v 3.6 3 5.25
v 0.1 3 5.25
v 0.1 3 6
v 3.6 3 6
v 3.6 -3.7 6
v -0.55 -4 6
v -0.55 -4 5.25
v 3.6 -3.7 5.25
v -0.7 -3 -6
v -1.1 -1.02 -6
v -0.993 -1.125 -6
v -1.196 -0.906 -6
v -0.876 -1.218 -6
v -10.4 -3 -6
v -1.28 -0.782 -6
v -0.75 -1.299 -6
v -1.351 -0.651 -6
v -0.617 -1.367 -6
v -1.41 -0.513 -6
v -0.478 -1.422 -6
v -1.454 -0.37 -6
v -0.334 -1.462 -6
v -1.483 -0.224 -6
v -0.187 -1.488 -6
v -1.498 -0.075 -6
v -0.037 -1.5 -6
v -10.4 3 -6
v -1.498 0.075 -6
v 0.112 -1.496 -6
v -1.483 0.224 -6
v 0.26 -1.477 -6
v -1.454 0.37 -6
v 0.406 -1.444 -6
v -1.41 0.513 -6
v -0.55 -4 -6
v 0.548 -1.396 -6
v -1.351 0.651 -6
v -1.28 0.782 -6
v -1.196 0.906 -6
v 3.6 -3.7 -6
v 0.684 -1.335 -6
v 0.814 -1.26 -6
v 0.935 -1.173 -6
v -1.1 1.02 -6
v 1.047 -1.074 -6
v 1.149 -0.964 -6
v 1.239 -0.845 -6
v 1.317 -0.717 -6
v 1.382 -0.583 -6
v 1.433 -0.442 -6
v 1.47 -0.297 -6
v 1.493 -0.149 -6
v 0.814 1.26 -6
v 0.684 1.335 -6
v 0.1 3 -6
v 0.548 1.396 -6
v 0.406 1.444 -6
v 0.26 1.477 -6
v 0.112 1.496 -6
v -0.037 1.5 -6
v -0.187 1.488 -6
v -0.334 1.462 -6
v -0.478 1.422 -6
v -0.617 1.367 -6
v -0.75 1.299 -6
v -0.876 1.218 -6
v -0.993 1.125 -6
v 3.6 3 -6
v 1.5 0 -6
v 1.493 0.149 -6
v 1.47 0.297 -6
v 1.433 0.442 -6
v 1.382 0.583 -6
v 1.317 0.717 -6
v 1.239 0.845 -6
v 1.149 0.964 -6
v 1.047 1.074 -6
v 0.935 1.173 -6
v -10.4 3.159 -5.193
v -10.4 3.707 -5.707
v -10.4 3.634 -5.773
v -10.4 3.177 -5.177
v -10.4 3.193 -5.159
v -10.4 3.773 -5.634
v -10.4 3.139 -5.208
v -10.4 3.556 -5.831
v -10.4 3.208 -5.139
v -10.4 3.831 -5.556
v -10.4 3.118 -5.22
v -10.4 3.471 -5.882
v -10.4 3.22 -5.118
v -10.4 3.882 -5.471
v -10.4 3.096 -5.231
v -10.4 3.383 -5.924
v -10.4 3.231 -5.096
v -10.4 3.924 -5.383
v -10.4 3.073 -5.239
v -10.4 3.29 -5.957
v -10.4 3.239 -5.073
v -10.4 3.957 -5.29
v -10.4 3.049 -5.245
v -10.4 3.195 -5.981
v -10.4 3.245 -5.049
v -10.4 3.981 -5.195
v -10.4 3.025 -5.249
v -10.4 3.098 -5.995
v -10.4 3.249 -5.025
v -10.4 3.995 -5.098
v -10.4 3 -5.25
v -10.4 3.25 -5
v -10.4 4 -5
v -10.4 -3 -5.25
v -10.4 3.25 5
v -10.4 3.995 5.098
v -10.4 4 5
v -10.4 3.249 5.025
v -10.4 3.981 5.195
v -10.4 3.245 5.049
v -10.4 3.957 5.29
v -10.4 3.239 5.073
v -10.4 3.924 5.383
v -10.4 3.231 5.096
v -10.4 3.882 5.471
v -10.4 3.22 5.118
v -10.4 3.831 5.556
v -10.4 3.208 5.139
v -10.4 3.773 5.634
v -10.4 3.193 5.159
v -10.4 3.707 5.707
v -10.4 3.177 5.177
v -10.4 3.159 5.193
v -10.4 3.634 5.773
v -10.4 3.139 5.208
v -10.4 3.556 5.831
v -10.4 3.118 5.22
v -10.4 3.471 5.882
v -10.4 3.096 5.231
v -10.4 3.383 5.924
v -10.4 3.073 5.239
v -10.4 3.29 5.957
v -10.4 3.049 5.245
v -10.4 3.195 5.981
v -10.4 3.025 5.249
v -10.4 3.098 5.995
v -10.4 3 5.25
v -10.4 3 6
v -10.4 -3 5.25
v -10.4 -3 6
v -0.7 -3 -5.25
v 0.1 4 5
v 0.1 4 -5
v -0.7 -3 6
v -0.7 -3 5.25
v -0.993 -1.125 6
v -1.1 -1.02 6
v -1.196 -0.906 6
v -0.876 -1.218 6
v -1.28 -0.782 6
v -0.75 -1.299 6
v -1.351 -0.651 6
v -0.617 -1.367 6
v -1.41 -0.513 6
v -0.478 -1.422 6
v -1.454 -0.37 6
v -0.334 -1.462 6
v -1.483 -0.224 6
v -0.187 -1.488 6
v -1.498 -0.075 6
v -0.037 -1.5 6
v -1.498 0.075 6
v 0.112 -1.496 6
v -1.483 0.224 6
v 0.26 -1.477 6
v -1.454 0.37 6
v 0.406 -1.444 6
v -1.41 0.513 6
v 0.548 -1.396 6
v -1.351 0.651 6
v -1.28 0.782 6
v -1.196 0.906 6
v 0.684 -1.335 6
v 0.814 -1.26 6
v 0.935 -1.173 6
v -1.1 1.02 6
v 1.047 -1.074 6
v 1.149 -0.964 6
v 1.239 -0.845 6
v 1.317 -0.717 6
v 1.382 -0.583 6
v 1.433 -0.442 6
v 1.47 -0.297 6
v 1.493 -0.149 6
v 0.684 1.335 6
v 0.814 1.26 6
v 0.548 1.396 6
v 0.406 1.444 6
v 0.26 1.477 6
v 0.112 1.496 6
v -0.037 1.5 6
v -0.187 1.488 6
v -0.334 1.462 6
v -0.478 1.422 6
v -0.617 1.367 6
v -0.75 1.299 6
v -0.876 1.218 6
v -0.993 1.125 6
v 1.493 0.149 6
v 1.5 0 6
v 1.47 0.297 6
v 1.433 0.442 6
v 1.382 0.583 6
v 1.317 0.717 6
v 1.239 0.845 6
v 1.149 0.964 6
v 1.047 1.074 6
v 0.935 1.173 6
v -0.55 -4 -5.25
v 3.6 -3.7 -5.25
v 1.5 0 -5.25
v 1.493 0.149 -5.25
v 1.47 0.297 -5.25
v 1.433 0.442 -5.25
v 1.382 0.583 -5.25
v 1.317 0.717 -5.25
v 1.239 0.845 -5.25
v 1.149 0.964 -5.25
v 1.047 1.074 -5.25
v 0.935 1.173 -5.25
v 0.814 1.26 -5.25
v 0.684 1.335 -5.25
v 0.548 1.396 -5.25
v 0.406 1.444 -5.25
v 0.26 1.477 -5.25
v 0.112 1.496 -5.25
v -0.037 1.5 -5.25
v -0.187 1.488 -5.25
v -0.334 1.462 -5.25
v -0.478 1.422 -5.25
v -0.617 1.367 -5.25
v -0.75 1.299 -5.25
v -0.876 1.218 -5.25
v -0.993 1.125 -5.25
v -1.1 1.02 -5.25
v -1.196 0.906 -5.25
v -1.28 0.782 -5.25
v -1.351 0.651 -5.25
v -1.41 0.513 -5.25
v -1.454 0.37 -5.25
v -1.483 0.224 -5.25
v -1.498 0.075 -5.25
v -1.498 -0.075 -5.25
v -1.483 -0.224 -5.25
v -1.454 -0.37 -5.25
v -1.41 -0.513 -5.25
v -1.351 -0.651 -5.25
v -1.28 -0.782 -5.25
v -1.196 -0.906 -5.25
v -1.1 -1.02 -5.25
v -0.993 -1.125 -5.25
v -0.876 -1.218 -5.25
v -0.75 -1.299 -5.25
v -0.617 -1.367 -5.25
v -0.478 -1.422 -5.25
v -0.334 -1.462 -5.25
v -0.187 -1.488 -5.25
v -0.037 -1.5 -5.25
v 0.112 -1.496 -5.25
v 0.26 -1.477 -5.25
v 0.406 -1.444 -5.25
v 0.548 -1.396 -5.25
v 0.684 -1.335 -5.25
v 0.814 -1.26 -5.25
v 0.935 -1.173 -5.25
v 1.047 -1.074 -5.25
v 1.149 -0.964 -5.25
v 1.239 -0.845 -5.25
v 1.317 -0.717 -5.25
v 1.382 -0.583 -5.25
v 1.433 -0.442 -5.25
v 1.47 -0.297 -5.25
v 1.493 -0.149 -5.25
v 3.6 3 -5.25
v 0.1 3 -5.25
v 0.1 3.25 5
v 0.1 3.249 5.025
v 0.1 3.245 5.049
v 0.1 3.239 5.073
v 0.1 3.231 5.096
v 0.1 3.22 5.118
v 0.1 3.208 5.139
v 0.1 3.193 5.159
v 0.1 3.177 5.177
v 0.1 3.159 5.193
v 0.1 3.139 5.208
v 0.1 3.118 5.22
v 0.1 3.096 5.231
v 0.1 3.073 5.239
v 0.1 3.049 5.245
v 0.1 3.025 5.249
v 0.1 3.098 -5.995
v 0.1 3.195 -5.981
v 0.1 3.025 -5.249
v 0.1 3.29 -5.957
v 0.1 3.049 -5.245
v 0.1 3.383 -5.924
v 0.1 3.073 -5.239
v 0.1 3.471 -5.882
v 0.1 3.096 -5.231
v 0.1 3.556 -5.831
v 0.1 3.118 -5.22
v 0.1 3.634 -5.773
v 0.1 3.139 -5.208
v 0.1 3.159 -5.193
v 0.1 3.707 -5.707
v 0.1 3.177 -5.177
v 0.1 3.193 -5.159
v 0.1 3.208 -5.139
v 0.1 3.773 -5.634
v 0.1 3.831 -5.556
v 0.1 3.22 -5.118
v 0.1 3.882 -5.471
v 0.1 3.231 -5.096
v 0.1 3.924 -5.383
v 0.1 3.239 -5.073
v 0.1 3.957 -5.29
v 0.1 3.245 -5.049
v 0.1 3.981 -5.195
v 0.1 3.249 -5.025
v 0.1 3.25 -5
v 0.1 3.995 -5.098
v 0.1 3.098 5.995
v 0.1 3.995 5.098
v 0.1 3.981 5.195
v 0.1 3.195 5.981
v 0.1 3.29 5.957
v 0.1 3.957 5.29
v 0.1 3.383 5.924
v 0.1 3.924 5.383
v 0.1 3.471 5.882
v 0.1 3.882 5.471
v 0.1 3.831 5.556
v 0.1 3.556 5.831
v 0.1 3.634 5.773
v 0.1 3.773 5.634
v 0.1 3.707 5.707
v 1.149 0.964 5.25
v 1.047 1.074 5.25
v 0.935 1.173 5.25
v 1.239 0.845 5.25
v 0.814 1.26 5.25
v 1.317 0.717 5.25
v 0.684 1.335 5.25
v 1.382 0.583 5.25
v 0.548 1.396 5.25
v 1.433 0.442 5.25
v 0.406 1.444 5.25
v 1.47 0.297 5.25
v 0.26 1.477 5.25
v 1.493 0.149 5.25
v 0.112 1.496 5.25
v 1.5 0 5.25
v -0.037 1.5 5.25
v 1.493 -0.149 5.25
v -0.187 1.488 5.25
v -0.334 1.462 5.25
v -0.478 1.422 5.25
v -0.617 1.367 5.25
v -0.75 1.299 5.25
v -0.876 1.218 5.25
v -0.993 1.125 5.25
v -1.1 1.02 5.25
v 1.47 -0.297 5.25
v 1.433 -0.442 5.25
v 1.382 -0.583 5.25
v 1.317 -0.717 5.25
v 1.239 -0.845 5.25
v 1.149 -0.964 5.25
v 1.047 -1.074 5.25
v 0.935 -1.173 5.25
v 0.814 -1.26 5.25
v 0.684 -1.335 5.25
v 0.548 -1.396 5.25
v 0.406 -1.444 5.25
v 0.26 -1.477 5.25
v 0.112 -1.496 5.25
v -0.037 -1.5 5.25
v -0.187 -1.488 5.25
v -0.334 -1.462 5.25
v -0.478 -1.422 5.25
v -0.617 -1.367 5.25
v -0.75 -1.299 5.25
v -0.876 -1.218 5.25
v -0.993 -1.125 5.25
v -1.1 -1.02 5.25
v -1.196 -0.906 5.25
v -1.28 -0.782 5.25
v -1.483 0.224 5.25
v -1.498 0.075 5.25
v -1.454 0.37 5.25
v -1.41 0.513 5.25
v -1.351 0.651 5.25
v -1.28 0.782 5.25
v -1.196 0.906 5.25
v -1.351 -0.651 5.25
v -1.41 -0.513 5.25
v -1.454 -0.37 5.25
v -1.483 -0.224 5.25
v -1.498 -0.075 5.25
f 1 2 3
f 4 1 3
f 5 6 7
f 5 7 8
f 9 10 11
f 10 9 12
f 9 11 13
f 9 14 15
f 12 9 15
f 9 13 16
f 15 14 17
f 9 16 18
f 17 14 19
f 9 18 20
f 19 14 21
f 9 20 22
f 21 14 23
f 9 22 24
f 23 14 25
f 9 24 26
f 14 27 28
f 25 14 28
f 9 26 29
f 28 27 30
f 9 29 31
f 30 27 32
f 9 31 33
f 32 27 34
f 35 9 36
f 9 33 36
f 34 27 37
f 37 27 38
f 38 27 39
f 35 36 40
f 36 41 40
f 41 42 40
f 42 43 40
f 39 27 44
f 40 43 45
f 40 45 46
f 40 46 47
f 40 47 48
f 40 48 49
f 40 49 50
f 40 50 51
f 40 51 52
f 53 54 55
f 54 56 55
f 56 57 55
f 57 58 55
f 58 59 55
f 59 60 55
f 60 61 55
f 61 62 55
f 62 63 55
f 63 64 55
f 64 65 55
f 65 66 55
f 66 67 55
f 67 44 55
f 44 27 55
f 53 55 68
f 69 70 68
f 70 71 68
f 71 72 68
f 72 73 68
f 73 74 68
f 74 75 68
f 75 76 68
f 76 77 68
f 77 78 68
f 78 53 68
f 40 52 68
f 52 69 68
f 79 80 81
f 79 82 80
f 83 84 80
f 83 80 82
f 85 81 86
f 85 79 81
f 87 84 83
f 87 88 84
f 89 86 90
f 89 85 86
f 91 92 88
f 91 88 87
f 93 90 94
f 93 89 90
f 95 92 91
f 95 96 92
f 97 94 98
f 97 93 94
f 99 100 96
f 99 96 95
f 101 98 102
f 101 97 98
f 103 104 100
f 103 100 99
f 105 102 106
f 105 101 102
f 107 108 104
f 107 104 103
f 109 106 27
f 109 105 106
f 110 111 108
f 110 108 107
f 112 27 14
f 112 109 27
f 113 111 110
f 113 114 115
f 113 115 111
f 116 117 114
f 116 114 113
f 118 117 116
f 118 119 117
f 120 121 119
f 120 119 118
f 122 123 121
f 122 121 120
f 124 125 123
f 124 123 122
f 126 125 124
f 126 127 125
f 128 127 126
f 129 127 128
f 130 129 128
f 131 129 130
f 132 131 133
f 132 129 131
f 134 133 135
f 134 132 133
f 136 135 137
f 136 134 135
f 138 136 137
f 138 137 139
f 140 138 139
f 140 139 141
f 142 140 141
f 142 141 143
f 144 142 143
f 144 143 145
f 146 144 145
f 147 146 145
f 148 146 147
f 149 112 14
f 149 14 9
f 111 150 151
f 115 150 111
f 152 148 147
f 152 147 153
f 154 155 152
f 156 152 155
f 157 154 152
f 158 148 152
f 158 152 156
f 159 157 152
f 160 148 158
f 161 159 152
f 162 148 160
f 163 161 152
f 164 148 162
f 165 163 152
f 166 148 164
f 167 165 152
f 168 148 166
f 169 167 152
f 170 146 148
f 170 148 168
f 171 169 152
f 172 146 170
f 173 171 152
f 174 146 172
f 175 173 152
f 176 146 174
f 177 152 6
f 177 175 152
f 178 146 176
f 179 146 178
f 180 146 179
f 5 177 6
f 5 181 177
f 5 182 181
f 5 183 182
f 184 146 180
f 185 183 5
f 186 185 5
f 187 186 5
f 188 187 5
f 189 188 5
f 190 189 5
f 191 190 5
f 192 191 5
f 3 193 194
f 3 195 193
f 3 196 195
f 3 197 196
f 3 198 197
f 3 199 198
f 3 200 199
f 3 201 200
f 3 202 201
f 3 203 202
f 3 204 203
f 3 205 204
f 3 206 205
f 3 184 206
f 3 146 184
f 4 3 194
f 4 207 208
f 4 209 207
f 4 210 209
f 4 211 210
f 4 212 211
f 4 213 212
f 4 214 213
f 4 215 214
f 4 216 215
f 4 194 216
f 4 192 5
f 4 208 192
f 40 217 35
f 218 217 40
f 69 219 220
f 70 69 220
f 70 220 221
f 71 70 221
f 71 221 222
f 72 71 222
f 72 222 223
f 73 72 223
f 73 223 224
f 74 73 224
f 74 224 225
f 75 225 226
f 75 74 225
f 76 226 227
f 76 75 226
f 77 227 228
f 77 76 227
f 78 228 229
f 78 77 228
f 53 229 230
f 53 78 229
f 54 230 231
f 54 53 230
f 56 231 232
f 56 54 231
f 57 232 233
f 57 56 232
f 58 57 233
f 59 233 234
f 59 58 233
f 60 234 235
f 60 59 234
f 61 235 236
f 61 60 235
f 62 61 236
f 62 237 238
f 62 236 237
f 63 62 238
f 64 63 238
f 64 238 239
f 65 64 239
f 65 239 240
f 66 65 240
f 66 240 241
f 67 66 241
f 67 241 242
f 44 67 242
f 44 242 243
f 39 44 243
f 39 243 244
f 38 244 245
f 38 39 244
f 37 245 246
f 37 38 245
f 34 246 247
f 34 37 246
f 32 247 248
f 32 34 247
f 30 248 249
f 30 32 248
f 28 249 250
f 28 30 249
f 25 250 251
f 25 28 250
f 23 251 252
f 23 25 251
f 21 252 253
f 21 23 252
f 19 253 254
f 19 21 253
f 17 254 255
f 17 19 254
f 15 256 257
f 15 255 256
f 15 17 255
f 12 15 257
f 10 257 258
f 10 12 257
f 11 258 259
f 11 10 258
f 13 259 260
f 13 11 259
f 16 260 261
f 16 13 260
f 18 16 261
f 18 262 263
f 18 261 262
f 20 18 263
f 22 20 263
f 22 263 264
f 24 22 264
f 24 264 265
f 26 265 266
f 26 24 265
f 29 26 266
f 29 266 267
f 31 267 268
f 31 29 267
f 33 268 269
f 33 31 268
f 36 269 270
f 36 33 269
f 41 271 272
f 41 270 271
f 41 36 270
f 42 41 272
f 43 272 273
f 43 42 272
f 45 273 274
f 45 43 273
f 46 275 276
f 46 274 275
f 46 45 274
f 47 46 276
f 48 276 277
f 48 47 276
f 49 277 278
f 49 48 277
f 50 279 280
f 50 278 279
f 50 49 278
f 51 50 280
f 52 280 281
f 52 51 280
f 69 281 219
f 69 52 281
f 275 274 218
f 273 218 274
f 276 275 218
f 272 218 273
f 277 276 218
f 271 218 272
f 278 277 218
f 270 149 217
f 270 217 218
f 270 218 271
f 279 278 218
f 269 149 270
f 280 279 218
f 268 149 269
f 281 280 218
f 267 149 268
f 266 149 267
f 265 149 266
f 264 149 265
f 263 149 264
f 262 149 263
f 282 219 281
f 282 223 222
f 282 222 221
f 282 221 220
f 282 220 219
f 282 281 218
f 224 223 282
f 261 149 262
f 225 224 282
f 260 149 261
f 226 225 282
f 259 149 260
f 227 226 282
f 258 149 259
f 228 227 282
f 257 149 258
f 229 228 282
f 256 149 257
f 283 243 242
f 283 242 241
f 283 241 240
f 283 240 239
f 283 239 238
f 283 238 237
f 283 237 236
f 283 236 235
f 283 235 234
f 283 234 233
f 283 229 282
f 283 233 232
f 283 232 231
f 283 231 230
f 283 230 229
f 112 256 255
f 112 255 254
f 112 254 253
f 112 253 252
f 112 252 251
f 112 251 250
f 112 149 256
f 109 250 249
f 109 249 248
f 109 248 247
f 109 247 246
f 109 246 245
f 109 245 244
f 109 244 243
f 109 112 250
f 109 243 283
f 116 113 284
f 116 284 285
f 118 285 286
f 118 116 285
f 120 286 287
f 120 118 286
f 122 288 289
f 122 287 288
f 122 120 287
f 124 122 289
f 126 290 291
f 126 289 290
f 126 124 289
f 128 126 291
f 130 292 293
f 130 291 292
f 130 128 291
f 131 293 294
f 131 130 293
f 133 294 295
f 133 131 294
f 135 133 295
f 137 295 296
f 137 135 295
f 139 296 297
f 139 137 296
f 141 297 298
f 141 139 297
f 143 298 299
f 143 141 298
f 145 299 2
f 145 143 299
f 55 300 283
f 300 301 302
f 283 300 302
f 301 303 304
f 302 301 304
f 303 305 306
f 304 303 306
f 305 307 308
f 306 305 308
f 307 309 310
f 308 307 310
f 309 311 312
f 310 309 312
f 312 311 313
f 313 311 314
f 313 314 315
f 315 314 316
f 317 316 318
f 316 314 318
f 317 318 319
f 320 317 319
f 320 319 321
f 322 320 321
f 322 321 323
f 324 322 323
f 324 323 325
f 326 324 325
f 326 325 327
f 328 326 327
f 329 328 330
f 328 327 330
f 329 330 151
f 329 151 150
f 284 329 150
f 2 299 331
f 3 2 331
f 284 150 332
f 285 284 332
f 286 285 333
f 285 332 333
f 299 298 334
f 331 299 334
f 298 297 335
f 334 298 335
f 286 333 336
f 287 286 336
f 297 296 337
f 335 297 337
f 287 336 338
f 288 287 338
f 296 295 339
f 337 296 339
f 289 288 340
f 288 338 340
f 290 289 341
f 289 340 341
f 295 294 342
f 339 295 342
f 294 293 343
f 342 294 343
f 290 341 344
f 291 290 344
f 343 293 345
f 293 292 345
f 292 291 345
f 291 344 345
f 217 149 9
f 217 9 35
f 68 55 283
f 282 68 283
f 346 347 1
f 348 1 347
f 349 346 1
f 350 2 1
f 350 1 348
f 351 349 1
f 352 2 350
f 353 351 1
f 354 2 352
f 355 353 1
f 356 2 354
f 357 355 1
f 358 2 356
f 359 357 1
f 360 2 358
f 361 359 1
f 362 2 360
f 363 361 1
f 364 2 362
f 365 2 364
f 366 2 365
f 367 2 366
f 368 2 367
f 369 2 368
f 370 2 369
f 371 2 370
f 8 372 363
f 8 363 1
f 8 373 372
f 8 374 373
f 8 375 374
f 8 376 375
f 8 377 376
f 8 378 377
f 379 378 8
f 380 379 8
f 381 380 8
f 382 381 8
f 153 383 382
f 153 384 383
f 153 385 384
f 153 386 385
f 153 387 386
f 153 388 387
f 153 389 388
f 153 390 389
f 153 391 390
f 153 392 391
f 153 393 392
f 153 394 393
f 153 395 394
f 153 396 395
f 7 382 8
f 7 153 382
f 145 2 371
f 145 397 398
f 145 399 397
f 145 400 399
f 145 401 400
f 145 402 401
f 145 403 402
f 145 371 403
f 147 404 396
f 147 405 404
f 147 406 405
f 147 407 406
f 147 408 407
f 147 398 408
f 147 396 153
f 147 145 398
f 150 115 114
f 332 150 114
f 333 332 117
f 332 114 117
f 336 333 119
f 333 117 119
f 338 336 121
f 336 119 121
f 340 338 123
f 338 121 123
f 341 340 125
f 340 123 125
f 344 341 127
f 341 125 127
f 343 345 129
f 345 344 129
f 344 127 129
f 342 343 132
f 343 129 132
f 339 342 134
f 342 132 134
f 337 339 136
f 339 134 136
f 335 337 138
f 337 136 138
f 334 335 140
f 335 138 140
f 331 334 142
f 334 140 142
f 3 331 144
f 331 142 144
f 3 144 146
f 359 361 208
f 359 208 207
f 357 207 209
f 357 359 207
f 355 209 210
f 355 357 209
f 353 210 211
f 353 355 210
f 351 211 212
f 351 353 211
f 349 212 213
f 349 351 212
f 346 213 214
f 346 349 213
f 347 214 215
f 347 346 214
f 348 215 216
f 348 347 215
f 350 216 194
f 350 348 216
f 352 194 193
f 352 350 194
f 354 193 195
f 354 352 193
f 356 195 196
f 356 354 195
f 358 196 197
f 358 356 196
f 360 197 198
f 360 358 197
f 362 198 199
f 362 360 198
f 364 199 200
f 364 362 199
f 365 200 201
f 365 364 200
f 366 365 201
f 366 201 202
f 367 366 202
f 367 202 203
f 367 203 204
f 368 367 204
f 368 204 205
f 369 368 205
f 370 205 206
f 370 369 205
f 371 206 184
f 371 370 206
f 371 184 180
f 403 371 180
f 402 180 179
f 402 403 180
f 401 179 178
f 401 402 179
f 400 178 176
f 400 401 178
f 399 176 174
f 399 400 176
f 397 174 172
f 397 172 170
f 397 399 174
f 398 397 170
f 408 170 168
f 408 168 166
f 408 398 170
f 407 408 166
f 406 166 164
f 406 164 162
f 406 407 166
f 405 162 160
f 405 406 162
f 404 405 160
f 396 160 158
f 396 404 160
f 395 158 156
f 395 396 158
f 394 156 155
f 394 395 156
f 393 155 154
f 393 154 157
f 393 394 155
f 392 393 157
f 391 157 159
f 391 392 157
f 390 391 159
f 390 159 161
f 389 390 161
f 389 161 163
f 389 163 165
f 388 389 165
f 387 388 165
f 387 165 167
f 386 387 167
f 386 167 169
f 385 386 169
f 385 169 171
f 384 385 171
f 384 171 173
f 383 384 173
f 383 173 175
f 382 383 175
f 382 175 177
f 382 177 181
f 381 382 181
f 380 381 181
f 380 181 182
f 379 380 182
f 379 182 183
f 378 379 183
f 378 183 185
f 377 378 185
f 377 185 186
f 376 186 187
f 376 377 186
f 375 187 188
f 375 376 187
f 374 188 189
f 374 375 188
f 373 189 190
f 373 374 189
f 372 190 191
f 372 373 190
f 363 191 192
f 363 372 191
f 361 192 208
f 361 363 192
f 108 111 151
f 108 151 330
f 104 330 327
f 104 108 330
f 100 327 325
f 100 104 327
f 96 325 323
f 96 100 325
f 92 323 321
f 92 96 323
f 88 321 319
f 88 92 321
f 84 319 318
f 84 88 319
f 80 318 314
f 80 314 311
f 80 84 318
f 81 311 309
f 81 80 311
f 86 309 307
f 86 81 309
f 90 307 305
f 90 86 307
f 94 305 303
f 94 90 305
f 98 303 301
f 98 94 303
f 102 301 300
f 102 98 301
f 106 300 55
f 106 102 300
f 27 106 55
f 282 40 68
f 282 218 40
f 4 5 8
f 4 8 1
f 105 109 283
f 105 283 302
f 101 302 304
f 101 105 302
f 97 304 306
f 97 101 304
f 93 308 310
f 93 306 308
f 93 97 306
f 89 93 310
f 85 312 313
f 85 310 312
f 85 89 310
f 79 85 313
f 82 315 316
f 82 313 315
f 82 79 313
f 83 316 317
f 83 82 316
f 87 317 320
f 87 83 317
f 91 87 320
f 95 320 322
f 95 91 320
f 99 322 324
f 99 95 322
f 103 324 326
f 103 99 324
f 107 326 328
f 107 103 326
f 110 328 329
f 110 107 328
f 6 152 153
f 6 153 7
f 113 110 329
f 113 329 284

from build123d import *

# Parameters (mm, degrees)
SKETCH1_R               = 1.5
BOSS_EXTRUDE1_DEPTH     = 6
FILLET1_R               = 1
CUT_EXTRUDE2_DEPTH      = 13.655433616
CUT_EXTRUDE2_DEPTH_BACK = 13.655433616
CUT_EXTRUDE3_DEPTH      = 16.748015748
CUT_EXTRUDE3_DEPTH_BACK = 3.5


with BuildPart() as part:
    # Sketch1 → Boss-Extrude1 (new, symmetric)
    with BuildSketch(Plane.XY):
        Polygon((-10.4, -3), (-0.7, -3), (-0.55, -4), (3.6, -3.7), (3.6, 4), (-10.4, 4), align=None)
        Circle(SKETCH1_R, mode=Mode.SUBTRACT)
    extrude(amount=BOSS_EXTRUDE1_DEPTH, both=True)

    # Fillet1
    fillet1_edges = [part.edges().sort_by_distance(p)[0] for p in [
        (-3.4, 4, -6),
        (-3.4, 4, 6),
    ]]
    fillet(fillet1_edges, radius=FILLET1_R)

    # Sketch2 → Cut-Extrude2 (cut, two sides: drawn at the far end of the back side and taken through both)
    with BuildSketch(Plane(origin=(0, 0, 0), x_dir=(0, 0, -1), z_dir=(1, 0, 0)).offset(-CUT_EXTRUDE2_DEPTH_BACK)):
        with BuildLine():
            Line((-5.25, 3), (-5.25, -4))
            Line((-5.25, -4), (5.25, -4))
            Line((5.25, -4), (5.25, 3))
            ThreePointArc((5.25, 3), (5.176776695, 3.176776695), (5, 3.25))
            Line((5, 3.25), (-5, 3.25))
            ThreePointArc((-5, 3.25), (-5.176776695, 3.176776695), (-5.25, 3))
        make_face()
    extrude(amount=CUT_EXTRUDE2_DEPTH + CUT_EXTRUDE2_DEPTH_BACK, mode=Mode.SUBTRACT)

    # Sketch3 → Cut-Extrude3 (cut, two sides: drawn at the far end of the back side and taken through both)
    with BuildSketch(Plane(origin=(3.6, 0, 0), x_dir=(0, 0, -1), z_dir=(1, 0, 0)).offset(-CUT_EXTRUDE3_DEPTH_BACK)):
        with BuildLine():
            Line((-5, 4), (5, 4))
            ThreePointArc((5, 4), (5.707106781, 3.707106781), (6, 3))
            Line((6, 3), (-6, 3))
            ThreePointArc((-6, 3), (-5.707106781, 3.707106781), (-5, 4))
        make_face()
    extrude(amount=CUT_EXTRUDE3_DEPTH + CUT_EXTRUDE3_DEPTH_BACK, mode=Mode.SUBTRACT)


solid = part.part
